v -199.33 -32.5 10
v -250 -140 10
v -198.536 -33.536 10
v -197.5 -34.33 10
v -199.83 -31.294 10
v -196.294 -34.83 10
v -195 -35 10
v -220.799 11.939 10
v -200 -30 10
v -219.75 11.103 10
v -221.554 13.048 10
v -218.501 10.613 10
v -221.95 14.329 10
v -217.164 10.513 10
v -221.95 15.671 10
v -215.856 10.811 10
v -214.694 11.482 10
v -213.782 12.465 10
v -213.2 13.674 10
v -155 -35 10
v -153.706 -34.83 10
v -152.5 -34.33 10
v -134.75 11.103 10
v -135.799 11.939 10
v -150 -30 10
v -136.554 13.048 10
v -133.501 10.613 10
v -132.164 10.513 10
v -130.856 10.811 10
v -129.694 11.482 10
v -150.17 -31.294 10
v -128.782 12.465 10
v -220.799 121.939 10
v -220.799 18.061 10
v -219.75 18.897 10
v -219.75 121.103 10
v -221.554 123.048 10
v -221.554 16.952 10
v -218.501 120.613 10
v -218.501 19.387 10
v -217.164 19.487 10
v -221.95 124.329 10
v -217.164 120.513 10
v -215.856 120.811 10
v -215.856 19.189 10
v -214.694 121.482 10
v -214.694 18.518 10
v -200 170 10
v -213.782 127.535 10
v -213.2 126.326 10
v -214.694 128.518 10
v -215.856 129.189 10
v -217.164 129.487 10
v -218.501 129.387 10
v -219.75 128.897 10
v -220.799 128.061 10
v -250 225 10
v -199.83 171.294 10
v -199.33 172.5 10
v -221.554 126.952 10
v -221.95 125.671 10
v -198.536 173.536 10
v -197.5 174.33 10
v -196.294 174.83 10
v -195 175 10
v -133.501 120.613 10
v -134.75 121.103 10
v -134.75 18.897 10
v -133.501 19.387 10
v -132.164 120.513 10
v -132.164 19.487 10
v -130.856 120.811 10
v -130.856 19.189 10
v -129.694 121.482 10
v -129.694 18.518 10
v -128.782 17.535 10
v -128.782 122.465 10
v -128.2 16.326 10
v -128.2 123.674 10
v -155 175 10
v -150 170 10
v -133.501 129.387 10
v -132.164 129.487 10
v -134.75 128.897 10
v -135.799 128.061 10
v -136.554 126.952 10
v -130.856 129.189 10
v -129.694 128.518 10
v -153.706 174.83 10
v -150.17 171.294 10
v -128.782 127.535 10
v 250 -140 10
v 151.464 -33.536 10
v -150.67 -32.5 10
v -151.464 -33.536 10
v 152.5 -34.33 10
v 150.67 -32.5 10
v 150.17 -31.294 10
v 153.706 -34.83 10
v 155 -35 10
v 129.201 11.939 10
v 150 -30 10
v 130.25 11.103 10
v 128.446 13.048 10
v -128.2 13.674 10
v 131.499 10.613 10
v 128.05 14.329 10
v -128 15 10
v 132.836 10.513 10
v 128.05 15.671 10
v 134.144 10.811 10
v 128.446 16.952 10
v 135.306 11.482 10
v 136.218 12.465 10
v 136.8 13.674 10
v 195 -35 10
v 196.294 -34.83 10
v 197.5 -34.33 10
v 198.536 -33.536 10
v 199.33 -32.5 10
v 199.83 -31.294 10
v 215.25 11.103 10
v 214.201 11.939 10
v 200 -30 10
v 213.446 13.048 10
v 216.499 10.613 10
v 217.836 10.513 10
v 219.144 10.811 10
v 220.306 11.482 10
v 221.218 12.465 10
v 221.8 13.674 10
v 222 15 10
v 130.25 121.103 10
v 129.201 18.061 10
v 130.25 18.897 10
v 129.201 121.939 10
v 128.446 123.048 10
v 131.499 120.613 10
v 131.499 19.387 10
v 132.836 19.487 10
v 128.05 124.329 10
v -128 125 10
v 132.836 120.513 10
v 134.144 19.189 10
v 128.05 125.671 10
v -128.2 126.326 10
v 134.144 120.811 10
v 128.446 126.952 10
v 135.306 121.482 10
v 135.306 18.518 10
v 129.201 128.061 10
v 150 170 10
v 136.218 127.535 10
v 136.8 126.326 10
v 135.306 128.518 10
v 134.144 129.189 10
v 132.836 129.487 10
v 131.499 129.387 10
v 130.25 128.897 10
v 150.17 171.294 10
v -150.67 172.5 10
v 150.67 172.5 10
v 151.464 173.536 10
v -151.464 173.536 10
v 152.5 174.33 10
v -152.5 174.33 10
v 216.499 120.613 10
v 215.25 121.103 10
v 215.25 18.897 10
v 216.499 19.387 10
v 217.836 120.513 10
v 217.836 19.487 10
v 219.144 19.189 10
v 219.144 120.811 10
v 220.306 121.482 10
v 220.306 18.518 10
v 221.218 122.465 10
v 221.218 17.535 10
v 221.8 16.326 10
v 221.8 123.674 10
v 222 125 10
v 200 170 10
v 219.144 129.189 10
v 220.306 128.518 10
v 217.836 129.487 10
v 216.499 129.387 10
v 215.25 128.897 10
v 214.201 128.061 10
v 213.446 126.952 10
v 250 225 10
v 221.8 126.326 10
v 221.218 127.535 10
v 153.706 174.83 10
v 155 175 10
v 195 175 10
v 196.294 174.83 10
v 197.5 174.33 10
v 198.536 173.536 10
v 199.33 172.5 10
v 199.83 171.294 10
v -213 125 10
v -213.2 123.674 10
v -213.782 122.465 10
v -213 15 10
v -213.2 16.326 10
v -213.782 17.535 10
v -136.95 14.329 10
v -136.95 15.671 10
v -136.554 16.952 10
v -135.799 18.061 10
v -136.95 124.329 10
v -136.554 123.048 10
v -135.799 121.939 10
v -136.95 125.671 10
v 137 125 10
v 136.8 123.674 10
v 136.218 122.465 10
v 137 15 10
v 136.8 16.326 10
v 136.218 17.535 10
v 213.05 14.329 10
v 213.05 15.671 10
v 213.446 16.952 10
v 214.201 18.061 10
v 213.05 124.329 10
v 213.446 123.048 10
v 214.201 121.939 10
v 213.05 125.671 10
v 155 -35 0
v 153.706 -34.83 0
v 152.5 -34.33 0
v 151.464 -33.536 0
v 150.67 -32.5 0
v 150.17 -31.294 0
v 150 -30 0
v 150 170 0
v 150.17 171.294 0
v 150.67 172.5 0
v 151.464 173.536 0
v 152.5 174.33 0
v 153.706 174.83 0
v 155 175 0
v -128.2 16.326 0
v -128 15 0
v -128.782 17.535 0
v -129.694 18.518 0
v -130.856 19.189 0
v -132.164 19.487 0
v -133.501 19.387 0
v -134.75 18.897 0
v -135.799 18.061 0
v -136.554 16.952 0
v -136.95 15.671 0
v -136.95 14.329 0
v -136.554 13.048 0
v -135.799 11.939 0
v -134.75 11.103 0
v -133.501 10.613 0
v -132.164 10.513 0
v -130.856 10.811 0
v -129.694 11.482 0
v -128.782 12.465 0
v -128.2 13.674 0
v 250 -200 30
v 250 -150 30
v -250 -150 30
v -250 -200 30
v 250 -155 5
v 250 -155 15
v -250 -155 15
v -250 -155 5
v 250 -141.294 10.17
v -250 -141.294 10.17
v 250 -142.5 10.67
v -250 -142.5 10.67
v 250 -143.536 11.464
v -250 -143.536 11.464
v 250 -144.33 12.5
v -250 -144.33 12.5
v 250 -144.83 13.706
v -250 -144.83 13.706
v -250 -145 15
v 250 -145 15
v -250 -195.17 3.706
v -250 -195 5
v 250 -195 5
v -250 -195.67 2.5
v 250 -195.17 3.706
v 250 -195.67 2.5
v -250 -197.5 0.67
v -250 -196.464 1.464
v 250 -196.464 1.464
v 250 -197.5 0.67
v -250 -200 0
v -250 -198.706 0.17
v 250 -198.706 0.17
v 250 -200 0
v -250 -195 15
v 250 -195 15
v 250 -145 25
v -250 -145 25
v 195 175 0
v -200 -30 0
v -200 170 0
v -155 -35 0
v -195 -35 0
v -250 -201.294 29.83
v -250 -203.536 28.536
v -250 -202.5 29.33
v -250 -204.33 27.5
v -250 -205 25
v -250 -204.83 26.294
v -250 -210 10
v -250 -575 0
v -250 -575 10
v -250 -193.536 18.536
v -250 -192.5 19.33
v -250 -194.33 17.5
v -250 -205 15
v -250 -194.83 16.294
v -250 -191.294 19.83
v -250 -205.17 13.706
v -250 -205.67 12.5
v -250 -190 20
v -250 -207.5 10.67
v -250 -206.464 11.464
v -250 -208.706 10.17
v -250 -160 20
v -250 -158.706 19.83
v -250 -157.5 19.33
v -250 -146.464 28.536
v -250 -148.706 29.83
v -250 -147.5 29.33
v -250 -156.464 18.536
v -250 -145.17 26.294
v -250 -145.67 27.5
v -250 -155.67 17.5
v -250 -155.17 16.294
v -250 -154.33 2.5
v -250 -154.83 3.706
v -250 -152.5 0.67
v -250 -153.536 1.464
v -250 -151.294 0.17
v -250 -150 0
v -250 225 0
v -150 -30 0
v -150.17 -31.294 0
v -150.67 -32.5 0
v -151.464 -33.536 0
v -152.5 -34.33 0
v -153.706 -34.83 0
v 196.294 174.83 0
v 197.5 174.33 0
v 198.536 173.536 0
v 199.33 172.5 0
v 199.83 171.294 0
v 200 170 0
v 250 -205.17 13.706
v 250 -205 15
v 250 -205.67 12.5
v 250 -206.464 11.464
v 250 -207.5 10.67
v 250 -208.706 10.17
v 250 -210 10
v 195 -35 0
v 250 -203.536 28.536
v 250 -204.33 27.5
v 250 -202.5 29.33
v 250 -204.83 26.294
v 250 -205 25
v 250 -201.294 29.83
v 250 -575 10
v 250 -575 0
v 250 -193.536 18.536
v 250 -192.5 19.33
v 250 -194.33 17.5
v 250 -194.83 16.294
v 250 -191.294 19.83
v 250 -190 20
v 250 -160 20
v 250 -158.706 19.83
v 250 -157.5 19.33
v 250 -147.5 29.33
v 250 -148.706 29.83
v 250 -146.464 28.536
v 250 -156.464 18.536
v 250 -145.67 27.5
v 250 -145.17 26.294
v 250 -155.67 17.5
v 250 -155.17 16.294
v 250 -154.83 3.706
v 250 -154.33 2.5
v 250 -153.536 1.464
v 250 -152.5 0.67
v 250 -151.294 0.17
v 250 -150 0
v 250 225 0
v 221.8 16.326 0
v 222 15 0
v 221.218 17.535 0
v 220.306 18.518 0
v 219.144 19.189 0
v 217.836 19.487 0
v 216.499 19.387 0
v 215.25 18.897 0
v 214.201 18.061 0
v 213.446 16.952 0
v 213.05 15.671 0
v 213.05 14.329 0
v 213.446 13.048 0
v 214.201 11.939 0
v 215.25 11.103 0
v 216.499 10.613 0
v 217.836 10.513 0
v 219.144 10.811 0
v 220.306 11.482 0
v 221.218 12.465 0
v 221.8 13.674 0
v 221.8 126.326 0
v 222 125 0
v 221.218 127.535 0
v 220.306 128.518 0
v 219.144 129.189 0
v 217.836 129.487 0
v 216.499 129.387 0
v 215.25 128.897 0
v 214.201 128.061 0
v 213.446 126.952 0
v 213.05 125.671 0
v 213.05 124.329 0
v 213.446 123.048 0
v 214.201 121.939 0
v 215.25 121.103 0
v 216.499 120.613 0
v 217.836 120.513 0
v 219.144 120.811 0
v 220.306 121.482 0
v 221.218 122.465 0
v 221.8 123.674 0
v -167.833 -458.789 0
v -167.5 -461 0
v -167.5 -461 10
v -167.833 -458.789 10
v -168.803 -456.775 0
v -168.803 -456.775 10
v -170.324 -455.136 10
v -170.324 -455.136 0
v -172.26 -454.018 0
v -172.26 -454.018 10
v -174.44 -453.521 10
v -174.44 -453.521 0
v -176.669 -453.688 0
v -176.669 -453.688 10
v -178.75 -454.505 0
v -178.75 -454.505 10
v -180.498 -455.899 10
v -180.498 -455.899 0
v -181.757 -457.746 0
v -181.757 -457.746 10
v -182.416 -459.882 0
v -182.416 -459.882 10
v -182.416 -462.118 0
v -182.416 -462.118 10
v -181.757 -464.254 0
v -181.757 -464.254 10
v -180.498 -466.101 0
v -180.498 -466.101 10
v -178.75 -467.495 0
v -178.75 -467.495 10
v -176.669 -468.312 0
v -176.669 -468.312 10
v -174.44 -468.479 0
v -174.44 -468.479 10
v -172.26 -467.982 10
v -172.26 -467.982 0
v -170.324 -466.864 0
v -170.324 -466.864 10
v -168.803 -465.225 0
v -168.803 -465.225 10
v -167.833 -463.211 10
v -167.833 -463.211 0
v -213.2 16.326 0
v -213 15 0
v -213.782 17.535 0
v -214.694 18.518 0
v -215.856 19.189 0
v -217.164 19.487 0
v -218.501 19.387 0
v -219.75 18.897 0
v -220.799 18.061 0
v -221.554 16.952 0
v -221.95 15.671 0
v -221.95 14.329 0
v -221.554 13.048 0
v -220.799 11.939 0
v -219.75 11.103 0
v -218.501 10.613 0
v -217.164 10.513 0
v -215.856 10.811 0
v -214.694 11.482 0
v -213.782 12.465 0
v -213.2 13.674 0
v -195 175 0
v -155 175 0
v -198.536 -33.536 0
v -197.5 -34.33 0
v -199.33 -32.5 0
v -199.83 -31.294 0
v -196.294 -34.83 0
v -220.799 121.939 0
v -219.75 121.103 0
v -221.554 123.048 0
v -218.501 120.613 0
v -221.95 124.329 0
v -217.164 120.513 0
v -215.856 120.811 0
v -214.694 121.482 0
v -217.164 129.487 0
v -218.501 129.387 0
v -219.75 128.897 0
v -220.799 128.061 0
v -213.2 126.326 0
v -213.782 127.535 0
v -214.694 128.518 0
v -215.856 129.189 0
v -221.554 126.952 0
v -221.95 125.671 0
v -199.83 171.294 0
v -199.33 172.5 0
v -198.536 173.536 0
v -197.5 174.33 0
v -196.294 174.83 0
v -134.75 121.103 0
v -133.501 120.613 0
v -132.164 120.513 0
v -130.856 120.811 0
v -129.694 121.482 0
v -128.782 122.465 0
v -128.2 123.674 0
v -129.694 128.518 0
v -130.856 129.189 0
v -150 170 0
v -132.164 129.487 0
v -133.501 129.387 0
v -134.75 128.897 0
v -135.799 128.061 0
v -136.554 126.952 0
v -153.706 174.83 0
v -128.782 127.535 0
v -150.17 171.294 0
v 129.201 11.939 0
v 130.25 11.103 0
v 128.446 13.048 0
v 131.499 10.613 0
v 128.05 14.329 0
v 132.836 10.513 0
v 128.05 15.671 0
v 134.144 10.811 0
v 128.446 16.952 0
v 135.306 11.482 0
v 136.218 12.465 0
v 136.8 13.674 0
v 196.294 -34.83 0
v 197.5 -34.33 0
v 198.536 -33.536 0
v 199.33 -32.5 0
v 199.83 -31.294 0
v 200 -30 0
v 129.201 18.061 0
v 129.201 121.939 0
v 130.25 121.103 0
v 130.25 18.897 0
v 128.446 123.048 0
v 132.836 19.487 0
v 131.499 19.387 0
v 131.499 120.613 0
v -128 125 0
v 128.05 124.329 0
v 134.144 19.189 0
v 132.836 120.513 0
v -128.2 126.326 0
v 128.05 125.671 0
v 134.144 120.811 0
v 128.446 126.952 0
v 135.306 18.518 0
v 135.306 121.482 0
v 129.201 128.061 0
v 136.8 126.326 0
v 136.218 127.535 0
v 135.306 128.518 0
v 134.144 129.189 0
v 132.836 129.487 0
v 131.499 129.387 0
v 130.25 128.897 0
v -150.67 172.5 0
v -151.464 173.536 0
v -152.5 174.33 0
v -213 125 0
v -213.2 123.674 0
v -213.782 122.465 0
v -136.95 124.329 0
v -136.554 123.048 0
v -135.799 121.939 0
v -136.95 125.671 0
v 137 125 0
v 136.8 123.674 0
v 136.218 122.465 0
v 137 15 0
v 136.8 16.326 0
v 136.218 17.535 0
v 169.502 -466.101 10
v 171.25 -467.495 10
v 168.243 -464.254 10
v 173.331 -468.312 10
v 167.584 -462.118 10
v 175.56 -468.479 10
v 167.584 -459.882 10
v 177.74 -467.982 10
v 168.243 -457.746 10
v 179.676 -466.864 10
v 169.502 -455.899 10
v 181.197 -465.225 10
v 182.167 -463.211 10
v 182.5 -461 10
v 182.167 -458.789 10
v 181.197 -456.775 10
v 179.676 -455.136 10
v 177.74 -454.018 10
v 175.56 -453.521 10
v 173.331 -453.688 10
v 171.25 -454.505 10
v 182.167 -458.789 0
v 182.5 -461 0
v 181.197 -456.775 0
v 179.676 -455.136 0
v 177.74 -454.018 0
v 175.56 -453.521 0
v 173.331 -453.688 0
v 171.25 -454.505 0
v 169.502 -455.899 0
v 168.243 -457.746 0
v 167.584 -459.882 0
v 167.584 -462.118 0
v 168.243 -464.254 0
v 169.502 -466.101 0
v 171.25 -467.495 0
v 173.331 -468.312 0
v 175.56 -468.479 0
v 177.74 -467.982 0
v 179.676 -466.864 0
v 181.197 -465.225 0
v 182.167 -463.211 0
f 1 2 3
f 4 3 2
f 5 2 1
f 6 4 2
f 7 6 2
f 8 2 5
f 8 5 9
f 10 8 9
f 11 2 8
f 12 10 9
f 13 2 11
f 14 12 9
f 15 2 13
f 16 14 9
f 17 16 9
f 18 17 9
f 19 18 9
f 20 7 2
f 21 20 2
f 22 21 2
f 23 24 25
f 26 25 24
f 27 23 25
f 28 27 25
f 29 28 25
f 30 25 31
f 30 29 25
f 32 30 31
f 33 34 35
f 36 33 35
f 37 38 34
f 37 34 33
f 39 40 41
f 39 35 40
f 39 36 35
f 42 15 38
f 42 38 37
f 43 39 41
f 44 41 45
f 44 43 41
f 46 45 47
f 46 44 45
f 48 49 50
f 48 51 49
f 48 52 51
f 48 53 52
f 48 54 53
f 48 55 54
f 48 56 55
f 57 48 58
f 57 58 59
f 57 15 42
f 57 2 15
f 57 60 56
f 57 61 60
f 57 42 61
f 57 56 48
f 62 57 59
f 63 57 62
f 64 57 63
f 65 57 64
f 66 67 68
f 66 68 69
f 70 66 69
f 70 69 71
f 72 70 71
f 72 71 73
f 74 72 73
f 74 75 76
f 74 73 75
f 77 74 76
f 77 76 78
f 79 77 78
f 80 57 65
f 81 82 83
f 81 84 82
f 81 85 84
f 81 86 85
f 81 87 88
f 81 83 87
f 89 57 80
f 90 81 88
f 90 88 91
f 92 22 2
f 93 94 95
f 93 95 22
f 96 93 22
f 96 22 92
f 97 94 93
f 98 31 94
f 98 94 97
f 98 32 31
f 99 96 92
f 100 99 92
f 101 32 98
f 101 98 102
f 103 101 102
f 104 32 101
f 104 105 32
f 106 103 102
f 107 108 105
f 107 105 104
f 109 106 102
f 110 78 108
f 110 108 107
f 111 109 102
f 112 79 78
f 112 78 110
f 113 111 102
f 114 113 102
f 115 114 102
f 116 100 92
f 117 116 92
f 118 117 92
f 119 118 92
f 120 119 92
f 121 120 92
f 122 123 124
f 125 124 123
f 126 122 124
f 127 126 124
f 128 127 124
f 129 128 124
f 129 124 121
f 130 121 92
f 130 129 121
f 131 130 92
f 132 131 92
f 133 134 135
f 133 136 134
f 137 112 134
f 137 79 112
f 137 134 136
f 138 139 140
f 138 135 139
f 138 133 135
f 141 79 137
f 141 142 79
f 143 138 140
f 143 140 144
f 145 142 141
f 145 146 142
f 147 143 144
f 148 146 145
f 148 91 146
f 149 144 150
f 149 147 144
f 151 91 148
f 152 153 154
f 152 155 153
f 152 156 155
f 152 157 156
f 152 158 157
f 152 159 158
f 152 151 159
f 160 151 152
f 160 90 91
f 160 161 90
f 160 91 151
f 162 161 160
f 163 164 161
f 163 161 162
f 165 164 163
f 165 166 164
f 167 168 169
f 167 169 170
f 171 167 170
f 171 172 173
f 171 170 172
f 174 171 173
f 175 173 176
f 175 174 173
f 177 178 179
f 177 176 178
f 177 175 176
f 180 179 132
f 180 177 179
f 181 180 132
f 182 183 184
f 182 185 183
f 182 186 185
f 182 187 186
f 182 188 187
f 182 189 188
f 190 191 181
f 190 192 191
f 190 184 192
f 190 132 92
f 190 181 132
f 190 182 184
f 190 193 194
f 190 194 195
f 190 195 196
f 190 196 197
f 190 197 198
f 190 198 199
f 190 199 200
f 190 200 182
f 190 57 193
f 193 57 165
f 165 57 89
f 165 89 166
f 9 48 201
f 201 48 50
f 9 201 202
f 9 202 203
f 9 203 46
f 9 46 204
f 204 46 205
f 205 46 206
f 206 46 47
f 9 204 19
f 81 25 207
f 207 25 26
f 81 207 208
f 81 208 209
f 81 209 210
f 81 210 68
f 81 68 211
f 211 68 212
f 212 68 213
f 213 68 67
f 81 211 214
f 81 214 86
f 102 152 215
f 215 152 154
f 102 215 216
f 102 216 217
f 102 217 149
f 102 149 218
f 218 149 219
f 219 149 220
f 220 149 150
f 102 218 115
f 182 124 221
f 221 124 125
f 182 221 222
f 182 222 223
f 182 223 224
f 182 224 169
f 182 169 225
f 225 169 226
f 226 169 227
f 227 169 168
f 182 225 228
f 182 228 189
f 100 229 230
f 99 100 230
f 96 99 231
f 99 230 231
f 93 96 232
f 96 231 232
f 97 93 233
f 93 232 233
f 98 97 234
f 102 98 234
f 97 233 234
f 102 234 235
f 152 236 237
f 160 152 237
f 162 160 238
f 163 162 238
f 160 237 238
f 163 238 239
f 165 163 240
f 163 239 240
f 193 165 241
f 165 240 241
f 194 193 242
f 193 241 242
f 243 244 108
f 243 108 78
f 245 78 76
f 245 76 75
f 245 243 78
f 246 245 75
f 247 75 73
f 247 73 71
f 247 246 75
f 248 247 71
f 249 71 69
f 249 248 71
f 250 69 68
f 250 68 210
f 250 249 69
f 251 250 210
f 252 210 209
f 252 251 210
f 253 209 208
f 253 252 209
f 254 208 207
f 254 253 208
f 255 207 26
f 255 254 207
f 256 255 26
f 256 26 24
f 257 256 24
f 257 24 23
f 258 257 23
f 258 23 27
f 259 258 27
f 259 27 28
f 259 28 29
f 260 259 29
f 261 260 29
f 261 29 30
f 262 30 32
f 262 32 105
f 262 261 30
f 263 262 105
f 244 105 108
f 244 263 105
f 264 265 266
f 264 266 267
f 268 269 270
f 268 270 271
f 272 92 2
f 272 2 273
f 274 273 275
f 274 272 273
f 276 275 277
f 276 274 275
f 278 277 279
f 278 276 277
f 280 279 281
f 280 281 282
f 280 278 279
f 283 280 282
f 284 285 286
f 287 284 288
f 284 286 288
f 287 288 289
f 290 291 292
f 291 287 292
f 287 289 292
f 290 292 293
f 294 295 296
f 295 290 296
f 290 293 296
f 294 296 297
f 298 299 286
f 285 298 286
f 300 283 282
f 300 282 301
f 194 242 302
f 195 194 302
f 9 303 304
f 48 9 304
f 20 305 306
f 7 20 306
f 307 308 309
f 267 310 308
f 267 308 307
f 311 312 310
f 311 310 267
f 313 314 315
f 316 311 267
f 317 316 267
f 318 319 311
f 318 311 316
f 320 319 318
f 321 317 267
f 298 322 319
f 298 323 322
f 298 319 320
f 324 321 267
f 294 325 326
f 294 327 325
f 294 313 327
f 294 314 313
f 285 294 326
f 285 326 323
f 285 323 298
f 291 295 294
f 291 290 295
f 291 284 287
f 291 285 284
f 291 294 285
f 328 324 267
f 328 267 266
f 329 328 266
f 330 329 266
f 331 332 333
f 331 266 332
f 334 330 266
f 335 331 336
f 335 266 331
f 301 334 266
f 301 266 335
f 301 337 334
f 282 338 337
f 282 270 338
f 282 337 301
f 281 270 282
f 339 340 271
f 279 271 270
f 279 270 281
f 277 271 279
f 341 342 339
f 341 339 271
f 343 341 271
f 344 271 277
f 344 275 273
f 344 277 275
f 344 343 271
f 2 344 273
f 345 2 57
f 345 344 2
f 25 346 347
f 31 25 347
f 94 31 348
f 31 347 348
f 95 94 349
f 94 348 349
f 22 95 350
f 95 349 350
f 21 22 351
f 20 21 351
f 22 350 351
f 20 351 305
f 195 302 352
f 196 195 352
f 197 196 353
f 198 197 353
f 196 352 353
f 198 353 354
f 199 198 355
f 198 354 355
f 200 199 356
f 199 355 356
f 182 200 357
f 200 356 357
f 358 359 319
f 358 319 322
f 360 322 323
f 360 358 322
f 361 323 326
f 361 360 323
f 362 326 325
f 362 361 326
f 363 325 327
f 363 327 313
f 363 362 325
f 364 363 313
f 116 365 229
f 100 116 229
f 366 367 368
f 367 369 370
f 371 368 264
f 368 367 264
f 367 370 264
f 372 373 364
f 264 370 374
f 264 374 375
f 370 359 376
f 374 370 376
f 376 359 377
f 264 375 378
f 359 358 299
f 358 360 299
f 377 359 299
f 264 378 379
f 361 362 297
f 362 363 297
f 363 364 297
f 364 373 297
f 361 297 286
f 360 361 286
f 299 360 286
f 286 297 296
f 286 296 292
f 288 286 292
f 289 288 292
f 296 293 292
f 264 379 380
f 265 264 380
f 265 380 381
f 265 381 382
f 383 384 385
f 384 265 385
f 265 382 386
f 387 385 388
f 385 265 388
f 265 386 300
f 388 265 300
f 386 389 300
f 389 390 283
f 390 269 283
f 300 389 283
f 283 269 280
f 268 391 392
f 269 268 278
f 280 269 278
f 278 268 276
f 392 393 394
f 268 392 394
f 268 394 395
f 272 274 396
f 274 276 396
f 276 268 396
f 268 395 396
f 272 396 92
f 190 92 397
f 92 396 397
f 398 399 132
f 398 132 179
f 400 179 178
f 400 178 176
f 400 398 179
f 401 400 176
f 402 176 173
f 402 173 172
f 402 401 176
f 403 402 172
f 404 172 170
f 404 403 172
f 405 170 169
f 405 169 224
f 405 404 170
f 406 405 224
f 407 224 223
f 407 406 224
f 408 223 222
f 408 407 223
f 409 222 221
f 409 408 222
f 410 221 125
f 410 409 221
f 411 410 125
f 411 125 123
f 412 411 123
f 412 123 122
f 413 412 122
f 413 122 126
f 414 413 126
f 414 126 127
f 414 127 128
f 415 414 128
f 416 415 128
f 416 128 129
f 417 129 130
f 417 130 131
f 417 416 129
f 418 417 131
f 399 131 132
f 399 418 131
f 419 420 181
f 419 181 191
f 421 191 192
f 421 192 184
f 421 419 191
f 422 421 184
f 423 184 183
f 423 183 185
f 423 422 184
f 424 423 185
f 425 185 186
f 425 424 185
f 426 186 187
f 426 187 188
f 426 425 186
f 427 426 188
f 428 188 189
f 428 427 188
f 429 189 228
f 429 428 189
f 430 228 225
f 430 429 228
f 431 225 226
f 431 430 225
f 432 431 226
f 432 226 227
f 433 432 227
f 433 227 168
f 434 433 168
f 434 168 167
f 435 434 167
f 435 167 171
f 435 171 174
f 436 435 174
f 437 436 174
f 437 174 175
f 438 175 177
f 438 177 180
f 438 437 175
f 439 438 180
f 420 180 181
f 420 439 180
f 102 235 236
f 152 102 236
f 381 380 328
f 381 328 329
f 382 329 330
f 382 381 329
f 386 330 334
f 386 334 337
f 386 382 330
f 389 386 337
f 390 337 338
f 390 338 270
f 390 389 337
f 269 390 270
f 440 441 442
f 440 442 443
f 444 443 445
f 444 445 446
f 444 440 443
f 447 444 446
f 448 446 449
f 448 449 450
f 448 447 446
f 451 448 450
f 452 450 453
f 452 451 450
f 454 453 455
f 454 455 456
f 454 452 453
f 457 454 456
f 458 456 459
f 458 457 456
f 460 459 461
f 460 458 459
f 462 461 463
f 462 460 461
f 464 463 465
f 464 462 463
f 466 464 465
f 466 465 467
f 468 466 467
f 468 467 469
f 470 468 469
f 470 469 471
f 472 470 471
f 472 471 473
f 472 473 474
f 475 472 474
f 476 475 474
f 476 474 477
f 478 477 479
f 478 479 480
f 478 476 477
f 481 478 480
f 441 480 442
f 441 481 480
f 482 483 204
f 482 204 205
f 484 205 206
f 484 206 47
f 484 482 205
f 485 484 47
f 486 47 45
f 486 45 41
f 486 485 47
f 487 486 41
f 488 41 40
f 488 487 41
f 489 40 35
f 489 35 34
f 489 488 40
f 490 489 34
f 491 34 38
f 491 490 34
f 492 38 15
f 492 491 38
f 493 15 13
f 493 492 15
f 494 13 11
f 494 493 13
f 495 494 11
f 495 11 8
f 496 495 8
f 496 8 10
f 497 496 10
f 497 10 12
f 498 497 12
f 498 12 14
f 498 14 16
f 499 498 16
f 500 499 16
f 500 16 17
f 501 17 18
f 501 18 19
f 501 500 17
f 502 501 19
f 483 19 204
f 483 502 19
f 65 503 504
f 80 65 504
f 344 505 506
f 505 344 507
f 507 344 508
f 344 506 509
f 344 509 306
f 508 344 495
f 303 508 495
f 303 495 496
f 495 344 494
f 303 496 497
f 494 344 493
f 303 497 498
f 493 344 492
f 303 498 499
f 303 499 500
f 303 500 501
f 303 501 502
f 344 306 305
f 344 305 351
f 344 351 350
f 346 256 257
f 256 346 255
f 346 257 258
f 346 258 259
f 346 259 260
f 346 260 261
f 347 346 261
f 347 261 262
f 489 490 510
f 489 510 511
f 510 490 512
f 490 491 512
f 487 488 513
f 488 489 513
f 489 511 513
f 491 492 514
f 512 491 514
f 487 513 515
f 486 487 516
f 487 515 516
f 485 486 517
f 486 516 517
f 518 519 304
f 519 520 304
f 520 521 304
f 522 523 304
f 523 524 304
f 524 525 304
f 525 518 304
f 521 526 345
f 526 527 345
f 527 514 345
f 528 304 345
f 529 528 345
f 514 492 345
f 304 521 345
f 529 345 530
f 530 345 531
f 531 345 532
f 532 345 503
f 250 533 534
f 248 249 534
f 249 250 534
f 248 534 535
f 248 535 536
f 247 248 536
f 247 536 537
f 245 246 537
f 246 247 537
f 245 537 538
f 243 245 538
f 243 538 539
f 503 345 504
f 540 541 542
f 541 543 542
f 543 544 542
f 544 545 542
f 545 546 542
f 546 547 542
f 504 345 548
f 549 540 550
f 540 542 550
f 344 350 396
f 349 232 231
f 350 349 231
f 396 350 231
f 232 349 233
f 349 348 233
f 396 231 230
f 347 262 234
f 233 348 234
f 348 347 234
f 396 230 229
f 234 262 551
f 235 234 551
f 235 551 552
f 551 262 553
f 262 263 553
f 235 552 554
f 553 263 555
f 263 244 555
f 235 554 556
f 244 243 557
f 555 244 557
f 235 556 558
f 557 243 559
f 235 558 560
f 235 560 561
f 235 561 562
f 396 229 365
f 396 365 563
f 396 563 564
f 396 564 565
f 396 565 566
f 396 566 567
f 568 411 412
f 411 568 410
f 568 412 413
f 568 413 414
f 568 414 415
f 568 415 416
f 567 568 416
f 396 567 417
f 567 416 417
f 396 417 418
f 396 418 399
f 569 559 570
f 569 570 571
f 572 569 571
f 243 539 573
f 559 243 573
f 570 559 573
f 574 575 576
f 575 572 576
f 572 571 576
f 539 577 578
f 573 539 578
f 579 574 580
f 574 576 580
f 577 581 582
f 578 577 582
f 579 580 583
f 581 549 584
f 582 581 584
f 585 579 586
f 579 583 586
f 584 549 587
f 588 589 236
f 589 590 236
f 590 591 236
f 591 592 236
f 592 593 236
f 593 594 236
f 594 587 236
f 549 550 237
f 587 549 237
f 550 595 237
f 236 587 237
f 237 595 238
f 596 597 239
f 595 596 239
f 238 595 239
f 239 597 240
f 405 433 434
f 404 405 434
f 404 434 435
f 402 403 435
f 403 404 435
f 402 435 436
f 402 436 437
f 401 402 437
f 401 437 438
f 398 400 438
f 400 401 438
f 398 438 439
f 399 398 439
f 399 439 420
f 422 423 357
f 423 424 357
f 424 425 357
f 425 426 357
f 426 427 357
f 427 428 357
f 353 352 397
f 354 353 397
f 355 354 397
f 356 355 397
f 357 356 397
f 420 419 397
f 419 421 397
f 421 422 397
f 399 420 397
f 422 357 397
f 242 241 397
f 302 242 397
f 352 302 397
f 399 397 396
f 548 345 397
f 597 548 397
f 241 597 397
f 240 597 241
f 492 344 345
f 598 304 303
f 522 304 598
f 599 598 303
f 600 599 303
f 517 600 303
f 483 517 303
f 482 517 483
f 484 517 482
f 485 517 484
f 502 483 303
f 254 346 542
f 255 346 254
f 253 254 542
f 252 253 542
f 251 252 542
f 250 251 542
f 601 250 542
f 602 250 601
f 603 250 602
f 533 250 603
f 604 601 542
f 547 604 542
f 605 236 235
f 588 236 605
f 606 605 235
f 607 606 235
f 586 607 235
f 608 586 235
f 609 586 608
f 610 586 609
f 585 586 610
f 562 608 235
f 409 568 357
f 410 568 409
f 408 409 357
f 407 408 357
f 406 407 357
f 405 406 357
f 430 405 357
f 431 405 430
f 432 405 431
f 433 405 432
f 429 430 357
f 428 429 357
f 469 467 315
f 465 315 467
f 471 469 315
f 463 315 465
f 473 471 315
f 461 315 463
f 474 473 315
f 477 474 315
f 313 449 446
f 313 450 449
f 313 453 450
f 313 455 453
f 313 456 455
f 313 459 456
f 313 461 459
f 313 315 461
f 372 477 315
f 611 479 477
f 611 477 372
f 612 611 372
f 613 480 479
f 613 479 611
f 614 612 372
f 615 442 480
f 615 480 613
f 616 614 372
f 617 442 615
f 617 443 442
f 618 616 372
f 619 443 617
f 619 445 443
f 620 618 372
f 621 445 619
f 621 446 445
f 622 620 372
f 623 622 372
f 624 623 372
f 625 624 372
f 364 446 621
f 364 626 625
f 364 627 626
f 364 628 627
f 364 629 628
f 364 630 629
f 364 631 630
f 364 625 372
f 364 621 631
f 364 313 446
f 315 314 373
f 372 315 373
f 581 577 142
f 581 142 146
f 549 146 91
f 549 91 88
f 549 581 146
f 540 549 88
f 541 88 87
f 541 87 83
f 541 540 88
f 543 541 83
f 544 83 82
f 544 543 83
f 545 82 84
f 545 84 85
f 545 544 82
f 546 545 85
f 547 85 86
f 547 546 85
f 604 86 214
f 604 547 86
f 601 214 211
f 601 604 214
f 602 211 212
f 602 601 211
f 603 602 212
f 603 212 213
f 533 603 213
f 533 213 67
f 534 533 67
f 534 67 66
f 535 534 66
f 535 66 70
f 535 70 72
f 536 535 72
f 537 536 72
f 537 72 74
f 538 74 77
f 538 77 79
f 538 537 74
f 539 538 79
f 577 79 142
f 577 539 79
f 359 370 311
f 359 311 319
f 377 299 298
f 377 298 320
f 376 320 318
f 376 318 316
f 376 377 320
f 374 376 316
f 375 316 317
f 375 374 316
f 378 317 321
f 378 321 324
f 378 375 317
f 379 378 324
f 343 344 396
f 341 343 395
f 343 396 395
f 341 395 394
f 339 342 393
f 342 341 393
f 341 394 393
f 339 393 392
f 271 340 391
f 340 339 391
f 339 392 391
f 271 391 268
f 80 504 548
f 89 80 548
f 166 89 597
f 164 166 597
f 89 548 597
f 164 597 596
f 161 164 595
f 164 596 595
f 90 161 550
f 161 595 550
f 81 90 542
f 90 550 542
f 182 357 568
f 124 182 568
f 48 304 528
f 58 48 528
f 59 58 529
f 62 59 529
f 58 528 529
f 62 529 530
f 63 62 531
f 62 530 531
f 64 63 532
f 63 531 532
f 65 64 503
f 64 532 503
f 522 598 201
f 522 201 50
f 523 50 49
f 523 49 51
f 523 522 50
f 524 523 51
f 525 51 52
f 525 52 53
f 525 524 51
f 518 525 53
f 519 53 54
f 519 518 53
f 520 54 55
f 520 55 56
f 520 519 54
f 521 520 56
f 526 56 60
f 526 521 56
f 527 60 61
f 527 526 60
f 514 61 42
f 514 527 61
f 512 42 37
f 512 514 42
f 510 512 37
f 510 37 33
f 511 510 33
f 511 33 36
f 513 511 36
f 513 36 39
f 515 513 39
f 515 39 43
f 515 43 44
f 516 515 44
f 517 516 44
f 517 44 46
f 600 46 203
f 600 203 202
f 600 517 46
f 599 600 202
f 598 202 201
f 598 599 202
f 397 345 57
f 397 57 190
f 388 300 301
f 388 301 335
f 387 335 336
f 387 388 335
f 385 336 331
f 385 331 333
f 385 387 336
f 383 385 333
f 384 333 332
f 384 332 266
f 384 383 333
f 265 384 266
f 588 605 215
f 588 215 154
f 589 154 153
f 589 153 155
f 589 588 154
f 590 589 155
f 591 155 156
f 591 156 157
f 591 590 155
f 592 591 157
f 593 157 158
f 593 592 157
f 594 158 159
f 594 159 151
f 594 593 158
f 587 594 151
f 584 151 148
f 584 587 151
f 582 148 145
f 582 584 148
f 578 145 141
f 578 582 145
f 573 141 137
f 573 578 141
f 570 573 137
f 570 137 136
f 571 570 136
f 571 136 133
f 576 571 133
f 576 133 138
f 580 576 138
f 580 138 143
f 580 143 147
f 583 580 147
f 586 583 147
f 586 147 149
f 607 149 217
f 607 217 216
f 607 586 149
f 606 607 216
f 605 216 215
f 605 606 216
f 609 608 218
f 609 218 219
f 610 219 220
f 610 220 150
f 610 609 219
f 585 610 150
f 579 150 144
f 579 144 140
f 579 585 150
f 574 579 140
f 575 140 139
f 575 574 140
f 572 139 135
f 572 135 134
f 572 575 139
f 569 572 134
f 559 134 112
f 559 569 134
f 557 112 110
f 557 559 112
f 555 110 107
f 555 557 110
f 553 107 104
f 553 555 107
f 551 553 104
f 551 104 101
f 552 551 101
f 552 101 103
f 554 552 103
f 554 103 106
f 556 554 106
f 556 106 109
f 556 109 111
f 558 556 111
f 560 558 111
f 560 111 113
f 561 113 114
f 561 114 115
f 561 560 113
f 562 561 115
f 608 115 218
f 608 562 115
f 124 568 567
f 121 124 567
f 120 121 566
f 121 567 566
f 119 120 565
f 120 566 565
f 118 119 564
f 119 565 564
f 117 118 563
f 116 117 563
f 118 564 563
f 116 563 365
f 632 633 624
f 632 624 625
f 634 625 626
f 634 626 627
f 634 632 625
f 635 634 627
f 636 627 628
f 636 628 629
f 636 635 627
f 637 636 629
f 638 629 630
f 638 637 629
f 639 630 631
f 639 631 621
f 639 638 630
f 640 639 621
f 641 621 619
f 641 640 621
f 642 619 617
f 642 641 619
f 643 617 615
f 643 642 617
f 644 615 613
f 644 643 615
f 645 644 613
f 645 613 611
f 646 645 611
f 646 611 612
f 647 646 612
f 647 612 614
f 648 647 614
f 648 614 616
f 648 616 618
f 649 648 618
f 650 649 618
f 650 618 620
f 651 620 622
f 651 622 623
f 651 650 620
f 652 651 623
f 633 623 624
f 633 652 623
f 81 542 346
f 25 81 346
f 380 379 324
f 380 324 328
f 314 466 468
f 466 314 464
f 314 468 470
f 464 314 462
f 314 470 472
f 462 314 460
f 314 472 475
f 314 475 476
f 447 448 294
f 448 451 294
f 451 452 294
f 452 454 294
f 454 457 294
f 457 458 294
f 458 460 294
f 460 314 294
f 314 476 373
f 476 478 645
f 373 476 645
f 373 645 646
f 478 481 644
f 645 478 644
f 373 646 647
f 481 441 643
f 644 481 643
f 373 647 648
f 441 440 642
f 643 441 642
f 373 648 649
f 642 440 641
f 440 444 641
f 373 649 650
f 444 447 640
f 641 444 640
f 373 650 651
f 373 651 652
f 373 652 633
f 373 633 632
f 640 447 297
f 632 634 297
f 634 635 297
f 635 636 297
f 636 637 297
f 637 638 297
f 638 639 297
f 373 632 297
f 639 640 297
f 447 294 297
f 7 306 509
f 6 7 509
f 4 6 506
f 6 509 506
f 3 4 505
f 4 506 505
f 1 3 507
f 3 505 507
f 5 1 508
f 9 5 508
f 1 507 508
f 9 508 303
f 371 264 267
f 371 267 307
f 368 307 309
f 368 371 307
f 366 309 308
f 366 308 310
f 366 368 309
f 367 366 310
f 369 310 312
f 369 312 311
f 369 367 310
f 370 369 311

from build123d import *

# Parameters (mm, degrees)
F0_W     = 500
F0_H     = 800
F0_R     = 7.5
F0_R_2   = 4.5
F1_DEPTH = 10
F3_DEPTH = 500
F5_DEPTH = 500.001


with BuildPart() as f1:
    # F0 (on Top) → F1 (new body)
    with BuildSketch(Plane.XY):
        with Locations((0, -175)):
            Rectangle(F0_W, F0_H)
        with Locations((-175, -461)):
            Circle(F0_R, mode=Mode.SUBTRACT)
        with Locations((175, -461)):
            Circle(F0_R, mode=Mode.SUBTRACT)
        with Locations((-217.5, 15)):
            Circle(F0_R_2, mode=Mode.SUBTRACT)
        with Locations((-132.5, 15)):
            Circle(F0_R_2, mode=Mode.SUBTRACT)
        with BuildLine():
            ThreePointArc((-200, 170), (-198.5355339059, 173.5355339059), (-195, 175))
            Line((-195, 175), (-155, 175))
            ThreePointArc((-155, 175), (-151.4644660941, 173.5355339059), (-150, 170))
            Line((-150, 170), (-150, -30))
            ThreePointArc((-150, -30), (-151.4644660941, -33.5355339059), (-155, -35))
            Line((-155, -35), (-195, -35))
            ThreePointArc((-195, -35), (-198.5355339059, -33.5355339059), (-200, -30))
            Line((-200, -30), (-200, 170))
        make_face(mode=Mode.SUBTRACT)
        with Locations((-217.5, 125)):
            Circle(F0_R_2, mode=Mode.SUBTRACT)
        with Locations((-132.5, 125)):
            Circle(F0_R_2, mode=Mode.SUBTRACT)
        with Locations((132.5, 15)):
            Circle(F0_R_2, mode=Mode.SUBTRACT)
        with Locations((217.5, 15)):
            Circle(F0_R_2, mode=Mode.SUBTRACT)
        with BuildLine():
            Line((195, -35), (155, -35))
            ThreePointArc((155, -35), (151.4644660941, -33.5355339059), (150, -30))
            Line((150, -30), (150, 170))
            ThreePointArc((150, 170), (151.4644660941, 173.5355339059), (155, 175))
            Line((155, 175), (195, 175))
            ThreePointArc((195, 175), (198.5355339059, 173.5355339059), (200, 170))
            Line((200, 170), (200, -30))
            ThreePointArc((200, -30), (198.5355339059, -33.5355339059), (195, -35))
        make_face(mode=Mode.SUBTRACT)
        with Locations((132.5, 125)):
            Circle(F0_R_2, mode=Mode.SUBTRACT)
        with Locations((217.5, 125)):
            Circle(F0_R_2, mode=Mode.SUBTRACT)
    extrude(amount=F1_DEPTH)

    # F2 (on face) → F3 (join, through all)
    with BuildSketch(Plane.YZ.offset(250)):
        with BuildLine():
            Line((-150, 30), (-200, 30))
            ThreePointArc((-200, 30), (-203.5355339059, 28.5355339059), (-205, 25))
            Line((-205, 25), (-205, 15))
            ThreePointArc((-205, 15), (-206.4644660941, 11.4644660941), (-210, 10))
            Line((-210, 10), (-195, 10))
            Line((-195, 10), (-195, 15))
            ThreePointArc((-195, 15), (-193.5355339059, 18.5355339059), (-190, 20))
            Line((-190, 20), (-160, 20))
            ThreePointArc((-160, 20), (-156.4644660941, 18.5355339059), (-155, 15))
            Line((-155, 15), (-155, 10))
            Line((-155, 10), (-140, 10))
            ThreePointArc((-140, 10), (-143.5355339059, 11.4644660941), (-145, 15))
            Line((-145, 15), (-145, 25))
            ThreePointArc((-145, 25), (-146.4644660941, 28.5355339059), (-150, 30))
        make_face()
    extrude(amount=-F3_DEPTH)

    # F4 (on face) → F5 (cut, through all)
    with BuildSketch(Plane.YZ.offset(250)):
        Polygon((-150, 0), (-200, 0), (-211.0108286142, 0), (-211.0108286142, -10.5340015143), (-138.8553231955, -10.5340015143), (-138.8553231955, 0), align=None)
        with BuildLine():
            Line((-155, 10), (-195, 10))
            Line((-195, 10), (-195, 5))
            ThreePointArc((-195, 5), (-196.4644660941, 1.4644660941), (-200, 0))
            Line((-200, 0), (-150, 0))
            ThreePointArc((-150, 0), (-153.5355339059, 1.4644660941), (-155, 5))
            Line((-155, 5), (-155, 10))
        make_face()
    extrude(amount=-F5_DEPTH, mode=Mode.SUBTRACT)


solid = f1.part
